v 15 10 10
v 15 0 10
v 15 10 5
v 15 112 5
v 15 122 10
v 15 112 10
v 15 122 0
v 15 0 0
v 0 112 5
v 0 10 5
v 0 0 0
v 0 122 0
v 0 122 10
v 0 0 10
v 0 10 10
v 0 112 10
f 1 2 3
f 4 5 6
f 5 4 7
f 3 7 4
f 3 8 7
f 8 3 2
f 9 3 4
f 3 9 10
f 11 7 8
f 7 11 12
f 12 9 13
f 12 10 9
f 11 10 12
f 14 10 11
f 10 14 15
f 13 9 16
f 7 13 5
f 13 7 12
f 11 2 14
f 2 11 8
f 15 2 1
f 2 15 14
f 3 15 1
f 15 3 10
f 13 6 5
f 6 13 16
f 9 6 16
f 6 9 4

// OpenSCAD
touch_pcb_y = 100;
pcb_border=1;

clamped_y = touch_pcb_y+2*pcb_border;
clamp_jaw_width=10;
clamp_jaw_z=5;

base_z = 5;
cube([15, clamped_y + 2*clamp_jaw_width,base_z]);

cube([15, clamp_jaw_width, base_z+clamp_jaw_z]);
translate([0,clamped_y+clamp_jaw_width,0])
    cube([15, clamp_jaw_width, base_z+clamp_jaw_z]);
